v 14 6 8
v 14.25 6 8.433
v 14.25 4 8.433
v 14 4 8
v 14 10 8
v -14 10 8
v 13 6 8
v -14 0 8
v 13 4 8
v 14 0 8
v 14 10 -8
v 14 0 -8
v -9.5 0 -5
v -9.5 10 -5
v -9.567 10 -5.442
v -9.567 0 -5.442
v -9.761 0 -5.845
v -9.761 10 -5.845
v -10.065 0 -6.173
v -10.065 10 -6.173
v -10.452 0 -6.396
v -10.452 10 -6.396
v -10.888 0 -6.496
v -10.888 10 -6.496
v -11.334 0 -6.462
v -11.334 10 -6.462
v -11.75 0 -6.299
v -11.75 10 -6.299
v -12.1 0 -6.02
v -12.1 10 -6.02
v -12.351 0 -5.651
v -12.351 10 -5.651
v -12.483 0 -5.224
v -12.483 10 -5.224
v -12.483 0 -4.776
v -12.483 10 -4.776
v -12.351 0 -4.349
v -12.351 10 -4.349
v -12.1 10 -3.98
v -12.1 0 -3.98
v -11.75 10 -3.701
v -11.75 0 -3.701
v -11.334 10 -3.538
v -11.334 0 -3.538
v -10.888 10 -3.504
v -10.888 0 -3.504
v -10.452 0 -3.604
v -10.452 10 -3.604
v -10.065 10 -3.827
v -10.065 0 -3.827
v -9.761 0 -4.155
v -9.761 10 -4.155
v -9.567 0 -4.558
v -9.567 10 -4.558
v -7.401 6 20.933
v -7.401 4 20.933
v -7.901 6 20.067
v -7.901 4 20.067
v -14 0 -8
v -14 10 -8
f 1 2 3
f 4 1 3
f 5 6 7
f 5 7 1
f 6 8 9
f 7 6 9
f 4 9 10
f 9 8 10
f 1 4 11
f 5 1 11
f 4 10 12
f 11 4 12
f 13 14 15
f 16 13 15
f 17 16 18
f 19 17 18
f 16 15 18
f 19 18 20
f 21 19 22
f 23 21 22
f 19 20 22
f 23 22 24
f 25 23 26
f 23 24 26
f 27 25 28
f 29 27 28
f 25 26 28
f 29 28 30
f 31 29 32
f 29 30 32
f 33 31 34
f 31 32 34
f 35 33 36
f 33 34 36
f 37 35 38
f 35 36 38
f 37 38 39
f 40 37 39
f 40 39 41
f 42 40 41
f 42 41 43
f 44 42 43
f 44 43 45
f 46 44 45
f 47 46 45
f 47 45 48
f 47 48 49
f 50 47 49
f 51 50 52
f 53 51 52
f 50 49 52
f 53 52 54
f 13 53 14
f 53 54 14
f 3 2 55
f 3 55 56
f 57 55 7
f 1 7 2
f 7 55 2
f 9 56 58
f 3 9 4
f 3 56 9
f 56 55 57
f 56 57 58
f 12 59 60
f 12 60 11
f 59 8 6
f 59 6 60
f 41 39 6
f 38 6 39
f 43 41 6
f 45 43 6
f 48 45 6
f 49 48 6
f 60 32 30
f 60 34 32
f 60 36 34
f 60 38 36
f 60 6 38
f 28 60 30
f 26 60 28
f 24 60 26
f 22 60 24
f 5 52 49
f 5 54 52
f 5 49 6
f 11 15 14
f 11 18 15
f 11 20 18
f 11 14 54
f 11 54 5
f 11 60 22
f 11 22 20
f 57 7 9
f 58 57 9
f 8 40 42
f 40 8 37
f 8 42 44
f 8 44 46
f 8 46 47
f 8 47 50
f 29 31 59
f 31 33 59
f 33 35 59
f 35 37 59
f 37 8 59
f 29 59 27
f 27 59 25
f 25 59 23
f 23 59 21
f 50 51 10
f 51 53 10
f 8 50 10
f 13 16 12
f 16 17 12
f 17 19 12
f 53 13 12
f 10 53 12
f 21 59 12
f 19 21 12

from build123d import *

# Parameters (mm, degrees)
SKETCH1_W           = 28
SKETCH1_H           = 16
BOSS_EXTRUDE1_DEPTH = 10
SKETCH2_W           = 2
SKETCH2_H           = 25
BOSS_EXTRUDE2_DEPTH = 0.5
SKETCH3_R           = 1.5
CUT_EXTRUDE1_DEPTH  = 10


with BuildPart() as part:
    # Sketch1 → Boss-Extrude1 (new body)
    with BuildSketch(Plane(origin=(0, 0, 0), x_dir=(1, 0, 0), z_dir=(0, 1, 0))):
        Rectangle(SKETCH1_W, SKETCH1_H)
    extrude(amount=BOSS_EXTRUDE1_DEPTH)

    # Sketch2 → Boss-Extrude2 (add, symmetric)
    with BuildSketch(Plane(origin=(6.964101615, 0, 12.062177826), x_dir=(0, -1, 0), z_dir=(0.5, 0, 0.866025404))):
        with Locations((-5, -4.375644347)):
            Rectangle(SKETCH2_W, SKETCH2_H)
    extrude(amount=BOSS_EXTRUDE2_DEPTH, both=True)

    # Sketch3 → Cut-Extrude1 (cut)
    with BuildSketch(Plane(origin=(0, 10, 0), x_dir=(1, 0, 0), z_dir=(0, 1, 0))):
        with Locations((-11, 5)):
            Circle(SKETCH3_R)
    extrude(amount=-CUT_EXTRUDE1_DEPTH, mode=Mode.SUBTRACT)


solid = part.part
